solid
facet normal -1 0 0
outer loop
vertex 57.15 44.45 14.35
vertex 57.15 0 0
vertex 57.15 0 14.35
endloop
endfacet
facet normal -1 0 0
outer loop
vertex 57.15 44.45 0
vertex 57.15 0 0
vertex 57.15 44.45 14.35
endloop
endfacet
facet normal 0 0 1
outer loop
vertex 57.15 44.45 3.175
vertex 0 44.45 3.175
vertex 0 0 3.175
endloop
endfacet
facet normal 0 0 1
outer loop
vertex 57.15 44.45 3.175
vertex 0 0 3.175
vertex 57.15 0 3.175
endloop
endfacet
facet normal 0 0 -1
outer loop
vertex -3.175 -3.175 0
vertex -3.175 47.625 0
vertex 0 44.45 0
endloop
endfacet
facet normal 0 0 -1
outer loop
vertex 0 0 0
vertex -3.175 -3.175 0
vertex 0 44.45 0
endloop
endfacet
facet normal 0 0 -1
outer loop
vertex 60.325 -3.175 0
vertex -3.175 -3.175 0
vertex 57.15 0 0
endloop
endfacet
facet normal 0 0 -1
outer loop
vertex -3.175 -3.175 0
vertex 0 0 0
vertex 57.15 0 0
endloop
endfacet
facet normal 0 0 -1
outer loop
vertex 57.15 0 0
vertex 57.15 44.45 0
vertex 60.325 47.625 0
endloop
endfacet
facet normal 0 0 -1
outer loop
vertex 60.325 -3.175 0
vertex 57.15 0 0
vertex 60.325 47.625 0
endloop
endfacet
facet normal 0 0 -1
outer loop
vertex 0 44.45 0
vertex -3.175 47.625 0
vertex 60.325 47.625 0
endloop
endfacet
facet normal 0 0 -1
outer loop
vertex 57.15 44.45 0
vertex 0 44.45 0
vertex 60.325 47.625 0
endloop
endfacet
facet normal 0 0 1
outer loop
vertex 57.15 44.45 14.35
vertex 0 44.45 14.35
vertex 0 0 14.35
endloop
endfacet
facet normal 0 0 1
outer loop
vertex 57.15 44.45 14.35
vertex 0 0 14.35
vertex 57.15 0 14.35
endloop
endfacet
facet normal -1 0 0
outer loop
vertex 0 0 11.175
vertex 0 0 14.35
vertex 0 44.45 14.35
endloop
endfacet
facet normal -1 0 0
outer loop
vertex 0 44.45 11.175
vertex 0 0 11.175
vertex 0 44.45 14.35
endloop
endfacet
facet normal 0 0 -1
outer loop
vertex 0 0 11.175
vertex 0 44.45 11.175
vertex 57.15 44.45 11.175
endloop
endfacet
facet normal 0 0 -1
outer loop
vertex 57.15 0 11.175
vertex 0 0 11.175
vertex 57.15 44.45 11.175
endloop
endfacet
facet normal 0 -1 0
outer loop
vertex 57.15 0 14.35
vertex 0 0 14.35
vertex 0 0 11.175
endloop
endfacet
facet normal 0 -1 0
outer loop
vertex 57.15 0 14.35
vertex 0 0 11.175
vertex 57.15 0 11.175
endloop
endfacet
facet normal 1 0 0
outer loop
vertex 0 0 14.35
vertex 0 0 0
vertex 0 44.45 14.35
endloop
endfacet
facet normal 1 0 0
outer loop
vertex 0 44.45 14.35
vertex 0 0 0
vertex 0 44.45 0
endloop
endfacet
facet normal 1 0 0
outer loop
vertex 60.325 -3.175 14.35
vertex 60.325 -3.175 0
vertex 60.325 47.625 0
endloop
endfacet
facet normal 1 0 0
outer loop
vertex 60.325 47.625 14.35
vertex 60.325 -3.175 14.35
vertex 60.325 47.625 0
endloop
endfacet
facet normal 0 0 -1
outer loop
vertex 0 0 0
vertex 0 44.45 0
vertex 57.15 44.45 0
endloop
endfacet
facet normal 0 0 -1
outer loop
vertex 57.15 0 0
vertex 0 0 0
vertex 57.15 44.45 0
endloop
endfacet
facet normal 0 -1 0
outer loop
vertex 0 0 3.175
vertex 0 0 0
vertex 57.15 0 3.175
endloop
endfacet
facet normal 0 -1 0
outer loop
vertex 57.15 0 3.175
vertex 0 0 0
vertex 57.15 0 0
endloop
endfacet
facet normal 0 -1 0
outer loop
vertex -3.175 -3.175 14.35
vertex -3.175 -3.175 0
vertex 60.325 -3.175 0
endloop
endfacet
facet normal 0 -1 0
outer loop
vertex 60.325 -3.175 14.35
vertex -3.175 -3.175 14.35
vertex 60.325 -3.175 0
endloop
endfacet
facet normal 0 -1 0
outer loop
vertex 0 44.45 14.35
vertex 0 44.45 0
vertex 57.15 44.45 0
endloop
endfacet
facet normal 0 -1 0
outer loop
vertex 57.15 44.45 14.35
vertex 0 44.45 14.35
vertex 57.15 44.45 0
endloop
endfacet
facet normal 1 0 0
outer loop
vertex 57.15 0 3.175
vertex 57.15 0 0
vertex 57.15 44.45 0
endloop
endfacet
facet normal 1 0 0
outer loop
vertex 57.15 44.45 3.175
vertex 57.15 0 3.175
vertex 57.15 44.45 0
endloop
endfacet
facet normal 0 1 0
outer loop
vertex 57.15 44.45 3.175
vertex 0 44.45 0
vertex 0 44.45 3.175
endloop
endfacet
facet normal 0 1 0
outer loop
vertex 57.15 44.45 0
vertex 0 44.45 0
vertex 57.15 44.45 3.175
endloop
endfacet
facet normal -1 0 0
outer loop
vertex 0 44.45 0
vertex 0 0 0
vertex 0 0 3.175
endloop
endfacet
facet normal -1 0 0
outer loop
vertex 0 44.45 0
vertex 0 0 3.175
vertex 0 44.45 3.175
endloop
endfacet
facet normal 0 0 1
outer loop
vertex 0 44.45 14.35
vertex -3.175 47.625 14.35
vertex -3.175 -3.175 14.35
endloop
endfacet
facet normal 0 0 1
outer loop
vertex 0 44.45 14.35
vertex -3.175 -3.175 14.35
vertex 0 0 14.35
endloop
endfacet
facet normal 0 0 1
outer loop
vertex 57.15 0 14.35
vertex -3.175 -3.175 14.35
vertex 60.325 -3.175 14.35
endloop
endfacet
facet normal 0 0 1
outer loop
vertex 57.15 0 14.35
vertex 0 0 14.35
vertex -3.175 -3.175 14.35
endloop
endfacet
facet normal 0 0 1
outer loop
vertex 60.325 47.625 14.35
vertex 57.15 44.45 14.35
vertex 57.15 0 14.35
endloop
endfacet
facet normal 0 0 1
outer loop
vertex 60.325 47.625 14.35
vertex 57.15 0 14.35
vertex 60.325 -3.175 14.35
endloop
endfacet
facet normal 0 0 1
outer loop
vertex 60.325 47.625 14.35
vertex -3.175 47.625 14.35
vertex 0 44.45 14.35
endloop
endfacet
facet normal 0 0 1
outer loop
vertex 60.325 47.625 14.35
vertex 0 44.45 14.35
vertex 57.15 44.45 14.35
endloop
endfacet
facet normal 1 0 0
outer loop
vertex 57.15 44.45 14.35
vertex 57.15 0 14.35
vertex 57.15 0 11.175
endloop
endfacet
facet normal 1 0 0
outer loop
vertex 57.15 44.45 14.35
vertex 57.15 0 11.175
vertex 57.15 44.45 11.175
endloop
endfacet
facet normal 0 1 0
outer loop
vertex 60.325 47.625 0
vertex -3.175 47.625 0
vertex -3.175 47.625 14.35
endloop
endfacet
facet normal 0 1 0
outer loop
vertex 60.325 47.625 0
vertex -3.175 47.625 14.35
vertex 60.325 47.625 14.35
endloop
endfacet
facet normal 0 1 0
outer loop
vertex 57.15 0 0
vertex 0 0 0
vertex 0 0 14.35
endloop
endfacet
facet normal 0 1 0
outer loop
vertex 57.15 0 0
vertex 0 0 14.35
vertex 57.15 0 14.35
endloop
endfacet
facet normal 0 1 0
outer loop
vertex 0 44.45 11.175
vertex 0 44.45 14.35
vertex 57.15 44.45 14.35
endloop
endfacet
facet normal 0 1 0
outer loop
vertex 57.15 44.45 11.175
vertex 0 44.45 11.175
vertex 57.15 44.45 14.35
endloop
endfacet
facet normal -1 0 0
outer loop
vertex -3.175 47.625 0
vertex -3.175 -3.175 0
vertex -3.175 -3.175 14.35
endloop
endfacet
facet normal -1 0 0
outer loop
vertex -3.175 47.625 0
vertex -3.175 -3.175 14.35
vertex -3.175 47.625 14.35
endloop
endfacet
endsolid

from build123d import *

# Parameters (mm, degrees)
F0_W     = 63.5
F0_H     = 50.8
F0_W_2   = 57.15
F0_H_2   = 44.45
F1_DEPTH = 14.35
F2_DEPTH = 3.175
F3_W     = 57.15
F3_H     = 44.45
F4_DEPTH = 3.175


with BuildPart() as f1:
    # F0 (on Top) → F1 (new body)
    with BuildSketch(Plane.XY):
        with Locations((28.575, 22.225)):
            Rectangle(F0_W, F0_H)
        with Locations((28.575, 22.225)):
            Rectangle(F0_W_2, F0_H_2, mode=Mode.SUBTRACT)
    extrude(amount=F1_DEPTH)


with BuildPart() as f2:
    # F0 (on Top) → F2 (new body)
    with BuildSketch(Plane.XY):
        with Locations((28.575, 22.225)):
            Rectangle(F0_W_2, F0_H_2)
    extrude(amount=F2_DEPTH)


with BuildPart() as f4:
    # F3 (on face) → F4 (new body)
    with BuildSketch(Plane.XY.offset(14.35)):
        with Locations((28.575, 22.225)):
            Rectangle(F3_W, F3_H)
    extrude(amount=-F4_DEPTH)


solid = Compound([f1.part, f2.part, f4.part])
